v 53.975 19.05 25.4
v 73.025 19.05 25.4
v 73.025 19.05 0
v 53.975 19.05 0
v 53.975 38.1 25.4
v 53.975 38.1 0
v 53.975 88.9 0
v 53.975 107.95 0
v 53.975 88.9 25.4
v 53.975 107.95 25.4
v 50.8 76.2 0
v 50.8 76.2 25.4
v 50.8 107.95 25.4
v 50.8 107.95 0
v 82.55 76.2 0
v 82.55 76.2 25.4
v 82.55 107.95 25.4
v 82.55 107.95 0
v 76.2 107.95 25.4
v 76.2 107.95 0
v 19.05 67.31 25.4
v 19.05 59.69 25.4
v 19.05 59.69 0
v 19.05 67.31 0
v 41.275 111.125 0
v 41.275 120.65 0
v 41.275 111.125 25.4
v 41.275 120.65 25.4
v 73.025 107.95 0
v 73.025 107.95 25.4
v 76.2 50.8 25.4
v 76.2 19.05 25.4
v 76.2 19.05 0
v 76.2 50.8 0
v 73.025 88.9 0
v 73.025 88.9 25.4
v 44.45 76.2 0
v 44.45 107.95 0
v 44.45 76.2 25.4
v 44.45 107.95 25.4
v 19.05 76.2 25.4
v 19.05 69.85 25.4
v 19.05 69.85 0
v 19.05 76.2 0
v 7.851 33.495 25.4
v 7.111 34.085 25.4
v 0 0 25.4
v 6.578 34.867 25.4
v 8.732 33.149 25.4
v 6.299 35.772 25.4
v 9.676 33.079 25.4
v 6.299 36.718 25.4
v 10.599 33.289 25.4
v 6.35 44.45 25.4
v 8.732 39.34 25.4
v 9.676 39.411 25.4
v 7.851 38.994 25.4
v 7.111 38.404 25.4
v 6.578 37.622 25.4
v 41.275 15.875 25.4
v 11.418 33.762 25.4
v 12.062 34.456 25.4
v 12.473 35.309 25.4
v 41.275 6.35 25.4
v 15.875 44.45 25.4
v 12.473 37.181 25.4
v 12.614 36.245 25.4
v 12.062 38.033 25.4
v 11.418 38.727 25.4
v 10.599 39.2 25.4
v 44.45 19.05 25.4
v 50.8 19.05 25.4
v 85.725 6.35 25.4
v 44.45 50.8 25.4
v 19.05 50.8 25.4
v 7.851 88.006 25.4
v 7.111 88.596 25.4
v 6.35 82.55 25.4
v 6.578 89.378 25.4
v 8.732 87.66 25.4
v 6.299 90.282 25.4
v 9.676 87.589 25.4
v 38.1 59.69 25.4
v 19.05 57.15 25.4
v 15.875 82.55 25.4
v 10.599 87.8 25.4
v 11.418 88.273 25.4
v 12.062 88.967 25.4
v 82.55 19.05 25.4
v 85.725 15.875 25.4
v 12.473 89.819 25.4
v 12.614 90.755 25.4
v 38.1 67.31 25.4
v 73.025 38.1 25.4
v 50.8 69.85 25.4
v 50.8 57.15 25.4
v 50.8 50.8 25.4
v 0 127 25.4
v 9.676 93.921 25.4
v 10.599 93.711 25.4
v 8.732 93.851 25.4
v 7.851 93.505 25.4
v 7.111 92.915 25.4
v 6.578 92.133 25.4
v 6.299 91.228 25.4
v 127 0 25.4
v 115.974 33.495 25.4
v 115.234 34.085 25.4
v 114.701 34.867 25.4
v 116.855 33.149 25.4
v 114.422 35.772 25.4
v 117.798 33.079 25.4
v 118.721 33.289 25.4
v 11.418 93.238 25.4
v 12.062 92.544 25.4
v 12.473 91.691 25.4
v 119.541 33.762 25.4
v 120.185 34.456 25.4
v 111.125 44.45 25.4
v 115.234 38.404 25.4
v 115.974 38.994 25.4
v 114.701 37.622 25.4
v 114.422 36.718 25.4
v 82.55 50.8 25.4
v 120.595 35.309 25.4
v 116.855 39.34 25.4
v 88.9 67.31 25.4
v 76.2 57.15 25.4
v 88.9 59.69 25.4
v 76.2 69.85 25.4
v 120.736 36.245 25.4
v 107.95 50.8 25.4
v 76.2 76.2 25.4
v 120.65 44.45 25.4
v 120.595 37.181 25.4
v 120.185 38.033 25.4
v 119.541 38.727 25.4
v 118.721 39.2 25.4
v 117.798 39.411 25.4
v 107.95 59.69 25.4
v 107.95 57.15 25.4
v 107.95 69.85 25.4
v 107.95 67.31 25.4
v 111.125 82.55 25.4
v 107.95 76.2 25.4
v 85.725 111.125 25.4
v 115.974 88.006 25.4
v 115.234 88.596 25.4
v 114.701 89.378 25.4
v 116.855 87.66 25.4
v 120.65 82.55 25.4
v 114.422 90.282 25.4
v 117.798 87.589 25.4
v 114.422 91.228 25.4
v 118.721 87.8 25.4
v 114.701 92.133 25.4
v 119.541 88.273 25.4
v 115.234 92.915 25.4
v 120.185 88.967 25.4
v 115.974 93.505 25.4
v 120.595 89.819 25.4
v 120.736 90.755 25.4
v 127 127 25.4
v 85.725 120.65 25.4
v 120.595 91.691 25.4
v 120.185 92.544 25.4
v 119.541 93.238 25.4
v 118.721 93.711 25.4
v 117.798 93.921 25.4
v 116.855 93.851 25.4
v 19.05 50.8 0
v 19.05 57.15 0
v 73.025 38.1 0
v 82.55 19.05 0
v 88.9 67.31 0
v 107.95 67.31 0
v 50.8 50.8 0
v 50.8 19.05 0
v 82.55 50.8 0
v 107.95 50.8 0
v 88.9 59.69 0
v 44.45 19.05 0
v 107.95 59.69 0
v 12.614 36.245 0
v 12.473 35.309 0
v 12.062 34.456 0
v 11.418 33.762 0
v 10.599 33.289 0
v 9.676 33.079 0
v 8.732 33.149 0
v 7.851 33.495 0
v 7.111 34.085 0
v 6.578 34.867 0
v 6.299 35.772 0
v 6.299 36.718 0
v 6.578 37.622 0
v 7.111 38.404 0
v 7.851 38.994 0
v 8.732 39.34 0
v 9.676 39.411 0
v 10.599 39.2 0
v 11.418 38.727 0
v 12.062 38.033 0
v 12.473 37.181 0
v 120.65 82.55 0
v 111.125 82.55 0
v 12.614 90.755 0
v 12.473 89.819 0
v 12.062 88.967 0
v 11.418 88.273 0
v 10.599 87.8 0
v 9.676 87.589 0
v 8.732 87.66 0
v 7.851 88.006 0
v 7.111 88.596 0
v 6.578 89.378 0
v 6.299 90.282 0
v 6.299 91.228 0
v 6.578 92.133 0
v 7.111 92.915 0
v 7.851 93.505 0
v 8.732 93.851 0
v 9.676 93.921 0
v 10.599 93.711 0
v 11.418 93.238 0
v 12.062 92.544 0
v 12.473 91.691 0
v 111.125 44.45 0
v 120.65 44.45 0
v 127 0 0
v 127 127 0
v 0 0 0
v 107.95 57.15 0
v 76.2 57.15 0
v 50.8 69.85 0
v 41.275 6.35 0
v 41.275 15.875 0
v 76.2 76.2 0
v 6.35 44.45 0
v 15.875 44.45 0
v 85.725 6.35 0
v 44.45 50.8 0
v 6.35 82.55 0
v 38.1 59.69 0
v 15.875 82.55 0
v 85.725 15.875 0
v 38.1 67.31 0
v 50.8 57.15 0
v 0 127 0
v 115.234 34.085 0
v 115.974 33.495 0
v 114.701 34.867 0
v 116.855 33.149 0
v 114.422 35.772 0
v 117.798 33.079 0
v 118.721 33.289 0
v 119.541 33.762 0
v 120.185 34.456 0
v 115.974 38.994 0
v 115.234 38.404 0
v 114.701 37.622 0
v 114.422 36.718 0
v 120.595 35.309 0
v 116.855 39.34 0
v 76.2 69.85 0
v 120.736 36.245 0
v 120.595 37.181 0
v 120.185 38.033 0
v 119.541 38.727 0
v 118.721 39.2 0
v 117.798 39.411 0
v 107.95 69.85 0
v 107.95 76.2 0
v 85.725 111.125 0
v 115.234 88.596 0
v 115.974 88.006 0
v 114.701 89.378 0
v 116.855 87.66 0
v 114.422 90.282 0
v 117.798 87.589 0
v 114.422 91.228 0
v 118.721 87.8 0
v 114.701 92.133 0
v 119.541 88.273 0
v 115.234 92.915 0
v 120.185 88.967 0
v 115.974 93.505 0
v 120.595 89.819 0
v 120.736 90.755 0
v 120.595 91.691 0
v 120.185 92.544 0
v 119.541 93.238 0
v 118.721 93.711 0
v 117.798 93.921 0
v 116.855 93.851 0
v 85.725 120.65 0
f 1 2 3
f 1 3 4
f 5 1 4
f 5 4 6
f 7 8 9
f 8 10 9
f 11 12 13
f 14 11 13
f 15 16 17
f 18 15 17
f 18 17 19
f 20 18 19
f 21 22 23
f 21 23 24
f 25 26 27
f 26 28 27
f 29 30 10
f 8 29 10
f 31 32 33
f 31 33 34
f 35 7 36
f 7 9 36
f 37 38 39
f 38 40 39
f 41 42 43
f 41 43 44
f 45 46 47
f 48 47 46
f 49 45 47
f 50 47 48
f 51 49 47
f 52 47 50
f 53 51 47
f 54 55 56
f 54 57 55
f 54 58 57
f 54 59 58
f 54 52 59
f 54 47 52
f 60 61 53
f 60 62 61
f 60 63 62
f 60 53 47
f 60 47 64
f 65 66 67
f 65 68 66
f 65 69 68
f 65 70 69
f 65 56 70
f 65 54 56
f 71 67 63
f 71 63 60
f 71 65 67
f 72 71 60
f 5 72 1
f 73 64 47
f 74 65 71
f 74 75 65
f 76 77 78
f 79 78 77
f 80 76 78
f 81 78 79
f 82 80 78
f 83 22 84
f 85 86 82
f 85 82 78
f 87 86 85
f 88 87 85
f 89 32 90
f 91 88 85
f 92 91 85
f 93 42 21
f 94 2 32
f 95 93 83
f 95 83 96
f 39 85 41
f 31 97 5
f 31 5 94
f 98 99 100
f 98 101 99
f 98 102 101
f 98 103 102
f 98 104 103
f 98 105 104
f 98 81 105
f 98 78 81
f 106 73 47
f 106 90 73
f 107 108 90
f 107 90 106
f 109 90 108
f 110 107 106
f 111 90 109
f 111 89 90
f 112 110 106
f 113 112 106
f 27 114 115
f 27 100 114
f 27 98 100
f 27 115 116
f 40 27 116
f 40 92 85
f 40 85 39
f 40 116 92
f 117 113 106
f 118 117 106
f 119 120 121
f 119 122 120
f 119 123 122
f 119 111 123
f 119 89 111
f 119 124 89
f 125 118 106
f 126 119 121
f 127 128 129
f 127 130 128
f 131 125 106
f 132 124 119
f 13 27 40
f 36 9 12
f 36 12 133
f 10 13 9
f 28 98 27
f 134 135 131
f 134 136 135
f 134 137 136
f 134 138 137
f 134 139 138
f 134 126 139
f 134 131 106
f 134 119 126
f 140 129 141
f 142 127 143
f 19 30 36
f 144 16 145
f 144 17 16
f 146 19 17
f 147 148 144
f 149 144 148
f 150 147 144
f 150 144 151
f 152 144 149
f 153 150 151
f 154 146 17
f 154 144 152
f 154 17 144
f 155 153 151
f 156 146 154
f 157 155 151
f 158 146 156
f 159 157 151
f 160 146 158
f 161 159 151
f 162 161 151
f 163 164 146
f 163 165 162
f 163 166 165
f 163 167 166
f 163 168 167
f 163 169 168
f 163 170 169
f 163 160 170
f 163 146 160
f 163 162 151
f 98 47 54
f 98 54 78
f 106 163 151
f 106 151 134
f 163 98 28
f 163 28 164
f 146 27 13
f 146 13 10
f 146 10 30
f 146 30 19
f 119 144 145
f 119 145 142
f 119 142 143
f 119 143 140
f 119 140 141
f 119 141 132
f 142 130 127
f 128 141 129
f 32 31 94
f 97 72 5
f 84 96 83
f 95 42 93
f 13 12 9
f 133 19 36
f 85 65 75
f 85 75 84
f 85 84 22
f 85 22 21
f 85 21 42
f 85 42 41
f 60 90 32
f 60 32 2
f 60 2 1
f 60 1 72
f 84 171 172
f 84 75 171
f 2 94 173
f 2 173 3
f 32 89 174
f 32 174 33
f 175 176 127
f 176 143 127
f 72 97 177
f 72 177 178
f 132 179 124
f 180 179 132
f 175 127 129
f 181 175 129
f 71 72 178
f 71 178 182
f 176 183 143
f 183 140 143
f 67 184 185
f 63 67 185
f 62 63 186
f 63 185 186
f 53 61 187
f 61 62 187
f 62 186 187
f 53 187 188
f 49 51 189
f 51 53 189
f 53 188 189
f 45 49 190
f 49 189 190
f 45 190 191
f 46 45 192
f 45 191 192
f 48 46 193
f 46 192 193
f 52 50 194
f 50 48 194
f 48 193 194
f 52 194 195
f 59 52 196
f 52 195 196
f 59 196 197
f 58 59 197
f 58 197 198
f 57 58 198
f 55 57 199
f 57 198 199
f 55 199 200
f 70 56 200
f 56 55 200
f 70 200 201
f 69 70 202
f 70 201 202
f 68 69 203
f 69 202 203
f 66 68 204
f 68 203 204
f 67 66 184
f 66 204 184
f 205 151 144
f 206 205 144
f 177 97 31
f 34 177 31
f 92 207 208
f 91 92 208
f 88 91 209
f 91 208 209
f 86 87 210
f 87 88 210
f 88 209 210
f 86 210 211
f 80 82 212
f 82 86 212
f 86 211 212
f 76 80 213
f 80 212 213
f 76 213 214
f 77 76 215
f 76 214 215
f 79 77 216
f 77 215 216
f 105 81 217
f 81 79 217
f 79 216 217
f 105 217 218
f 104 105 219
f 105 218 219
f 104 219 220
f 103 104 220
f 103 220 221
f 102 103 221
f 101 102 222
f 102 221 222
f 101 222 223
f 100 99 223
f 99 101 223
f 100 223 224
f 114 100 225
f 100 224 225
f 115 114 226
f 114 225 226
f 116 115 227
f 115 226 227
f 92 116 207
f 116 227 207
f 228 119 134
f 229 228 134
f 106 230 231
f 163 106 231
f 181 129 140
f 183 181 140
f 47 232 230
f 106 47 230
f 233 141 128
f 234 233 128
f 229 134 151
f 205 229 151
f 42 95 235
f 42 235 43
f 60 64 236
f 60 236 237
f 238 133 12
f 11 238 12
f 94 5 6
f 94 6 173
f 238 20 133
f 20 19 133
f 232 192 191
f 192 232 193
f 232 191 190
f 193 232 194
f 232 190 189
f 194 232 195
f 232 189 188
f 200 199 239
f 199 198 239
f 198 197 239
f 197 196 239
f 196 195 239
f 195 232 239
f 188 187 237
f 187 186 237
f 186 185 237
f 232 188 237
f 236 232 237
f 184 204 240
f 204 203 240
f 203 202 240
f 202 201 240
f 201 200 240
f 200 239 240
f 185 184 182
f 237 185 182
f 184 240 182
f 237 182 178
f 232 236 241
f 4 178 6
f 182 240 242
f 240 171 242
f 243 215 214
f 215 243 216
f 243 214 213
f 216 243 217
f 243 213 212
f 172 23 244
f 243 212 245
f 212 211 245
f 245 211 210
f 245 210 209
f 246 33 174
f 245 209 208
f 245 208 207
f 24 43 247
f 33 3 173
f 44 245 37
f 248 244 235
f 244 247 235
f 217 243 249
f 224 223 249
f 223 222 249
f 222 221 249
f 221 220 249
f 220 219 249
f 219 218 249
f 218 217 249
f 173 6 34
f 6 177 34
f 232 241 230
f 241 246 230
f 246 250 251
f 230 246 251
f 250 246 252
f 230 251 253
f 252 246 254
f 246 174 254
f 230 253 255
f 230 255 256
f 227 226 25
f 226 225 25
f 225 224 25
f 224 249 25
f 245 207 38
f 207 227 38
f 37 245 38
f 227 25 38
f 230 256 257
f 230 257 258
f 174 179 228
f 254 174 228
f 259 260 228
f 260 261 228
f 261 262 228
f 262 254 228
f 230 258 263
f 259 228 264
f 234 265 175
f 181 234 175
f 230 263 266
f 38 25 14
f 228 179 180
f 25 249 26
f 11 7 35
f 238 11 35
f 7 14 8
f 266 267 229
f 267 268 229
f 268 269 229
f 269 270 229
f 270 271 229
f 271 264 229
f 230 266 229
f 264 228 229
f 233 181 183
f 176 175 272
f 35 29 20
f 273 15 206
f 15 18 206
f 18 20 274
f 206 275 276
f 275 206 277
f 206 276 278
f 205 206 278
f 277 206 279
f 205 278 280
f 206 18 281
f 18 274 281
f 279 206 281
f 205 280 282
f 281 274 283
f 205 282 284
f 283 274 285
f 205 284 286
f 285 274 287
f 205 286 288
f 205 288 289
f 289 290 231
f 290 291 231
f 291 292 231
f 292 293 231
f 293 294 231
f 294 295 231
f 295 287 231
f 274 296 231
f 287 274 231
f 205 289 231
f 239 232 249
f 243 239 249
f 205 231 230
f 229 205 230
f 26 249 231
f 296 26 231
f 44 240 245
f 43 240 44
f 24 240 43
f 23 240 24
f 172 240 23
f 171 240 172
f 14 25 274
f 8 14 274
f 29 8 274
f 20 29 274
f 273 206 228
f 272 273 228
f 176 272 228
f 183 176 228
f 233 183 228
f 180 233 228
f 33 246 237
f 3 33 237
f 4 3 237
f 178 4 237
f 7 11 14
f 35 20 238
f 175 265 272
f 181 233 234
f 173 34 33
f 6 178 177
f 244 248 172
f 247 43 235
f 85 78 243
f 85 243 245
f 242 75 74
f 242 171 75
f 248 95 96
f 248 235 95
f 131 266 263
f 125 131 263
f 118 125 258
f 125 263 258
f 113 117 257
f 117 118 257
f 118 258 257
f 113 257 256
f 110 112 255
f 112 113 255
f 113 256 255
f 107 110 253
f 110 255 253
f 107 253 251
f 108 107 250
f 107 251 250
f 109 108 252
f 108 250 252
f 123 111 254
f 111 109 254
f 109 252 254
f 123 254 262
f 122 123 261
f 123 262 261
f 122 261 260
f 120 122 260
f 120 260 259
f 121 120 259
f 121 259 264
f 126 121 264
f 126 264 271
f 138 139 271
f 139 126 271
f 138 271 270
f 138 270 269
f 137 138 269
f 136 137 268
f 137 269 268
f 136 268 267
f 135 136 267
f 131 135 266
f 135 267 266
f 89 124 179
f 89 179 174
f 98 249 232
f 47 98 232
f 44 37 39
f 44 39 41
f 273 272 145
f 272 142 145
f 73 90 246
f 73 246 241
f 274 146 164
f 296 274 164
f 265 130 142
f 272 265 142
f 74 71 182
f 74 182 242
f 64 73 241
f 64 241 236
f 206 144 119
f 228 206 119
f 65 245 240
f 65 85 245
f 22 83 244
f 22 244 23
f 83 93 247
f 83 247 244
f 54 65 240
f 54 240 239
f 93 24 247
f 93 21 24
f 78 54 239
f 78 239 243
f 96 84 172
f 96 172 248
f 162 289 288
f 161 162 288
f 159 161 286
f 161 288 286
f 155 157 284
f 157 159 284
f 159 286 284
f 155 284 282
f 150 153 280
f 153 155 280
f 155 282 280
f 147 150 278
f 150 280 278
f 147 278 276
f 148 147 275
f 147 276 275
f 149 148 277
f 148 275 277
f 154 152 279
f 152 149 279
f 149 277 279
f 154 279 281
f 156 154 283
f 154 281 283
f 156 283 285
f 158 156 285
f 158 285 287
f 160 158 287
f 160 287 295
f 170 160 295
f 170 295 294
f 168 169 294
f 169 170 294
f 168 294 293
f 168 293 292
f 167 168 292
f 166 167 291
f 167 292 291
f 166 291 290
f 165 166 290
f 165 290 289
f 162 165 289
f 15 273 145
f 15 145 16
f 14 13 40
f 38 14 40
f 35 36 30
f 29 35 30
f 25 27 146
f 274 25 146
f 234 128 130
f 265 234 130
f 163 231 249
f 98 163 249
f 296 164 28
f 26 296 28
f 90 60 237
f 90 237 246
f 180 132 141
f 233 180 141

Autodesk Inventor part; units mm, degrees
ref_plane "YZ Plane" through (0, 0, 0) normal (1, 0, 0) x (0, 1, 0)
ref_plane "XZ Plane" through (0, 0, 0) normal (0, 1, 0) x (-1, 0, 0)
ref_plane "XY Plane" through (0, 0, 0) normal (0, 0, 1) x (1, 0, 0)
sketch "Sketch1" plane through (0, 0, 0) normal (0, 0, 1) x (1, 0, 0)
  line L0 (0, 0) -> (127, 0)
  line L1 (127, 0) -> (127, 127)
  line L2 (127, 127) -> (0, 127)
  line L3 (0, 127) -> (0, 0)
  circle A0 centre (63.5, 63.5) radius 12.6844 construction
  circle A1 centre (9.4388, 90.7552) radius 3.175
  circle A2 centre (117.5612, 90.7552) radius 3.175
  circle A3 centre (117.5612, 36.2448) radius 3.175
  circle A4 centre (9.4388, 36.2448) radius 3.175
  line L4 (9.4388, 90.7552) -> (117.5612, 36.2448) construction
  line L5 (50.8, 50.8) -> (76.2, 50.8)
  line L6 (76.2, 50.8) -> (76.2, 76.2)
  line L7 (76.2, 76.2) -> (50.8, 76.2)
  line L8 (50.8, 76.2) -> (50.8, 50.8)
  line L9 (50.8, 50.8) -> (76.2, 76.2) construction
  line L10 (76.2, 50.8) -> (50.8, 76.2) construction
  point P0 (63.5, 127)
  point P1 (127, 63.5)
  dimension "d0" = 127
  dimension "d1" = 127
  dimension "d2" = 6.35
  dimension "d6" = 25.4
  dimension "d7" = 25.4
extrude "Extrusion1" add sketch "Sketch1" along normal blind 25.4
sketch "Sketch2" plane through (0, 0, 25.4) normal (0, 0, 1) x (1, 0, 0)
  line L0 (50.8, 50.8) -> (50.8, 76.2) projected
  line L1 (19.05, 76.2) -> (50.8, 76.2)
  line L2 (50.8, 76.2) -> (50.8, 69.85)
  line L3 (50.8, 69.85) -> (19.05, 69.85)
  line L4 (19.05, 69.85) -> (19.05, 76.2)
  line L5 (19.05, 57.15) -> (50.8, 57.15)
  line L6 (50.8, 57.15) -> (50.8, 50.8)
  line L7 (50.8, 50.8) -> (19.05, 50.8)
  line L8 (19.05, 50.8) -> (19.05, 57.15)
  line L9 (19.05, 67.31) -> (38.1, 67.31)
  line L10 (38.1, 67.31) -> (38.1, 59.69)
  line L11 (38.1, 59.69) -> (19.05, 59.69)
  line L12 (19.05, 59.69) -> (19.05, 67.31)
  line L13 (50.8, 76.2) -> (76.2, 76.2) projected
  line L14 (0, 127) -> (0, 0) projected
  line L15 (127, 127) -> (0, 127) projected
  line L16 (63.5, 127) -> (63.5, 0) construction
  line L17 (0, 0) -> (127, 0) projected
  line L18 (76.2, 50.8) -> (76.2, 76.2)
  line L19 (107.95, 76.2) -> (76.2, 76.2)
  line L20 (76.2, 76.2) -> (76.2, 69.85)
  line L21 (76.2, 69.85) -> (107.95, 69.85)
  line L22 (107.95, 69.85) -> (107.95, 76.2)
  line L23 (107.95, 57.15) -> (76.2, 57.15)
  line L24 (76.2, 57.15) -> (76.2, 50.8)
  line L25 (76.2, 50.8) -> (107.95, 50.8)
  line L26 (107.95, 50.8) -> (107.95, 57.15)
  line L27 (107.95, 67.31) -> (88.9, 67.31)
  line L28 (88.9, 67.31) -> (88.9, 59.69)
  line L29 (88.9, 59.69) -> (107.95, 59.69)
  line L30 (107.95, 59.69) -> (107.95, 67.31)
  line L31 (127, 127) -> (127, 0)
  point P0 (50.8, 76.2)
  dimension "d8" = 6.35
  dimension "d9" = 6.35
  dimension "d10" = 2.54
  dimension "d11" = 2.54
  dimension "d12" = 12.7
  dimension "d13" = 19.05
extrude "Extrusion2" cut sketch "Sketch2" against normal blind 25.4 contours L7 L8 L5 L0 | L23 L26 L25 L18 | L19 L22 L21 L18 | L3 L4 L1 L0 | L9 L10 L11 L12 | L30 L29 L28 L27
sketch "Sketch4" plane through (0, 0, 25.4) normal (0, 0, 1) x (1, 0, 0)
  line L0 (6.35, 82.55) -> (15.875, 82.55)
  line L1 (15.875, 82.55) -> (15.875, 44.45)
  line L2 (15.875, 44.45) -> (6.35, 44.45)
  line L3 (6.35, 44.45) -> (6.35, 82.55)
  line L4 (0, 127) -> (0, 0) projected
  line L5 (19.05, 69.85) -> (19.05, 76.2) projected
  line L6 (127, 127) -> (0, 127) projected
  line L7 (63.5, 127) -> (63.5, 0) construction
  line L8 (0, 0) -> (127, 0) projected
  line L9 (120.65, 82.55) -> (111.125, 82.55)
  line L10 (111.125, 82.55) -> (111.125, 44.45)
  line L11 (111.125, 44.45) -> (120.65, 44.45)
  line L12 (120.65, 44.45) -> (120.65, 82.55)
  line L13 (127, 127) -> (127, 0)
  line L14 (107.95, 69.85) -> (107.95, 76.2)
  point P0 (6.35, 63.5)
  point P1 (0, 63.5)
  point P2 (120.65, 63.5)
  dimension "d25" = 38.1
  dimension "d27" = 3.175
  dimension "d28" = 6.35
extrude "Extrusion4" cut sketch "Sketch4" against normal blind 25.4 contours L0 L1 L2 L3 | L12 L11 L10 L9
sketch "Sketch3" plane through (0, 0, 25.4) normal (0, 0, 1) x (1, 0, 0)
  line L0 (19.05, 50.8) -> (107.95, 50.8) projected
  line L1 (44.45, 50.8) -> (50.8, 50.8)
  line L2 (50.8, 50.8) -> (50.8, 19.05)
  line L3 (50.8, 19.05) -> (44.45, 19.05)
  line L4 (44.45, 19.05) -> (44.45, 50.8)
  line L5 (76.2, 50.8) -> (82.55, 50.8)
  line L6 (82.55, 50.8) -> (82.55, 19.05)
  line L7 (82.55, 19.05) -> (76.2, 19.05)
  line L8 (76.2, 19.05) -> (76.2, 50.8)
  line L9 (53.975, 38.1) -> (73.025, 38.1)
  line L10 (73.025, 38.1) -> (73.025, 19.05)
  line L11 (73.025, 19.05) -> (53.975, 19.05)
  line L12 (53.975, 19.05) -> (53.975, 38.1)
  line L13 (0, 0) -> (127, 0) projected
  line L14 (0, 127) -> (0, 0) projected
  line L15 (0, 63.5) -> (127, 63.5) construction
  line L16 (44.45, 76.2) -> (50.8, 76.2)
  line L17 (50.8, 76.2) -> (50.8, 107.95)
  line L18 (50.8, 107.95) -> (44.45, 107.95)
  line L19 (44.45, 107.95) -> (44.45, 76.2)
  line L20 (76.2, 76.2) -> (82.55, 76.2)
  line L21 (82.55, 76.2) -> (82.55, 107.95)
  line L22 (82.55, 107.95) -> (76.2, 107.95)
  line L23 (76.2, 107.95) -> (76.2, 76.2)
  line L24 (53.975, 88.9) -> (73.025, 88.9)
  line L25 (73.025, 88.9) -> (73.025, 107.95)
  line L26 (73.025, 107.95) -> (53.975, 107.95)
  line L27 (53.975, 107.95) -> (53.975, 88.9)
  point P0 (63.5, 19.05)
  point P1 (63.5, 50.8)
  point P2 (63.5, 107.95)
  point P3 (63.5, 76.2)
  dimension "d16" = 19.05
  dimension "d17" = 3.175
  dimension "d18" = 3.175
  dimension "d19" = 19.05
  dimension "d20" = 6.35
  dimension "d21" = 6.35
  dimension "d22" = 12.7
extrude "Extrusion3" cut sketch "Sketch3" against normal blind 25.4
sketch "Sketch5" plane through (0, 0, 25.4) normal (0, 0, 1) x (1, 0, 0)
  line L0 (41.275, 15.875) -> (85.725, 15.875)
  line L1 (85.725, 15.875) -> (85.725, 6.35)
  line L2 (85.725, 6.35) -> (41.275, 6.35)
  line L3 (41.275, 6.35) -> (41.275, 15.875)
  line L4 (0, 127) -> (0, 0) projected
  line L5 (0, 63.5) -> (127, 63.5) construction
  line L6 (127, 0) -> (127, 127) projected
  line L7 (73.025, 19.05) -> (53.975, 19.05) projected
  line L8 (0, 0) -> (127, 0) projected
  line L9 (41.275, 111.125) -> (85.725, 111.125)
  line L10 (85.725, 111.125) -> (85.725, 120.65)
  line L11 (85.725, 120.65) -> (41.275, 120.65)
  line L12 (41.275, 120.65) -> (41.275, 111.125)
  point P0 (63.5, 6.35)
  point P1 (63.5, 0)
  point P2 (63.5, 120.65)
  point P3 (63.5, 127)
  dimension "d31" = 3.175
  dimension "d32" = 6.35
  dimension "d33" = 44.45
extrude "Extrusion5" cut sketch "Sketch5" against normal blind 25.4
properties part number "BearingFlexure"
